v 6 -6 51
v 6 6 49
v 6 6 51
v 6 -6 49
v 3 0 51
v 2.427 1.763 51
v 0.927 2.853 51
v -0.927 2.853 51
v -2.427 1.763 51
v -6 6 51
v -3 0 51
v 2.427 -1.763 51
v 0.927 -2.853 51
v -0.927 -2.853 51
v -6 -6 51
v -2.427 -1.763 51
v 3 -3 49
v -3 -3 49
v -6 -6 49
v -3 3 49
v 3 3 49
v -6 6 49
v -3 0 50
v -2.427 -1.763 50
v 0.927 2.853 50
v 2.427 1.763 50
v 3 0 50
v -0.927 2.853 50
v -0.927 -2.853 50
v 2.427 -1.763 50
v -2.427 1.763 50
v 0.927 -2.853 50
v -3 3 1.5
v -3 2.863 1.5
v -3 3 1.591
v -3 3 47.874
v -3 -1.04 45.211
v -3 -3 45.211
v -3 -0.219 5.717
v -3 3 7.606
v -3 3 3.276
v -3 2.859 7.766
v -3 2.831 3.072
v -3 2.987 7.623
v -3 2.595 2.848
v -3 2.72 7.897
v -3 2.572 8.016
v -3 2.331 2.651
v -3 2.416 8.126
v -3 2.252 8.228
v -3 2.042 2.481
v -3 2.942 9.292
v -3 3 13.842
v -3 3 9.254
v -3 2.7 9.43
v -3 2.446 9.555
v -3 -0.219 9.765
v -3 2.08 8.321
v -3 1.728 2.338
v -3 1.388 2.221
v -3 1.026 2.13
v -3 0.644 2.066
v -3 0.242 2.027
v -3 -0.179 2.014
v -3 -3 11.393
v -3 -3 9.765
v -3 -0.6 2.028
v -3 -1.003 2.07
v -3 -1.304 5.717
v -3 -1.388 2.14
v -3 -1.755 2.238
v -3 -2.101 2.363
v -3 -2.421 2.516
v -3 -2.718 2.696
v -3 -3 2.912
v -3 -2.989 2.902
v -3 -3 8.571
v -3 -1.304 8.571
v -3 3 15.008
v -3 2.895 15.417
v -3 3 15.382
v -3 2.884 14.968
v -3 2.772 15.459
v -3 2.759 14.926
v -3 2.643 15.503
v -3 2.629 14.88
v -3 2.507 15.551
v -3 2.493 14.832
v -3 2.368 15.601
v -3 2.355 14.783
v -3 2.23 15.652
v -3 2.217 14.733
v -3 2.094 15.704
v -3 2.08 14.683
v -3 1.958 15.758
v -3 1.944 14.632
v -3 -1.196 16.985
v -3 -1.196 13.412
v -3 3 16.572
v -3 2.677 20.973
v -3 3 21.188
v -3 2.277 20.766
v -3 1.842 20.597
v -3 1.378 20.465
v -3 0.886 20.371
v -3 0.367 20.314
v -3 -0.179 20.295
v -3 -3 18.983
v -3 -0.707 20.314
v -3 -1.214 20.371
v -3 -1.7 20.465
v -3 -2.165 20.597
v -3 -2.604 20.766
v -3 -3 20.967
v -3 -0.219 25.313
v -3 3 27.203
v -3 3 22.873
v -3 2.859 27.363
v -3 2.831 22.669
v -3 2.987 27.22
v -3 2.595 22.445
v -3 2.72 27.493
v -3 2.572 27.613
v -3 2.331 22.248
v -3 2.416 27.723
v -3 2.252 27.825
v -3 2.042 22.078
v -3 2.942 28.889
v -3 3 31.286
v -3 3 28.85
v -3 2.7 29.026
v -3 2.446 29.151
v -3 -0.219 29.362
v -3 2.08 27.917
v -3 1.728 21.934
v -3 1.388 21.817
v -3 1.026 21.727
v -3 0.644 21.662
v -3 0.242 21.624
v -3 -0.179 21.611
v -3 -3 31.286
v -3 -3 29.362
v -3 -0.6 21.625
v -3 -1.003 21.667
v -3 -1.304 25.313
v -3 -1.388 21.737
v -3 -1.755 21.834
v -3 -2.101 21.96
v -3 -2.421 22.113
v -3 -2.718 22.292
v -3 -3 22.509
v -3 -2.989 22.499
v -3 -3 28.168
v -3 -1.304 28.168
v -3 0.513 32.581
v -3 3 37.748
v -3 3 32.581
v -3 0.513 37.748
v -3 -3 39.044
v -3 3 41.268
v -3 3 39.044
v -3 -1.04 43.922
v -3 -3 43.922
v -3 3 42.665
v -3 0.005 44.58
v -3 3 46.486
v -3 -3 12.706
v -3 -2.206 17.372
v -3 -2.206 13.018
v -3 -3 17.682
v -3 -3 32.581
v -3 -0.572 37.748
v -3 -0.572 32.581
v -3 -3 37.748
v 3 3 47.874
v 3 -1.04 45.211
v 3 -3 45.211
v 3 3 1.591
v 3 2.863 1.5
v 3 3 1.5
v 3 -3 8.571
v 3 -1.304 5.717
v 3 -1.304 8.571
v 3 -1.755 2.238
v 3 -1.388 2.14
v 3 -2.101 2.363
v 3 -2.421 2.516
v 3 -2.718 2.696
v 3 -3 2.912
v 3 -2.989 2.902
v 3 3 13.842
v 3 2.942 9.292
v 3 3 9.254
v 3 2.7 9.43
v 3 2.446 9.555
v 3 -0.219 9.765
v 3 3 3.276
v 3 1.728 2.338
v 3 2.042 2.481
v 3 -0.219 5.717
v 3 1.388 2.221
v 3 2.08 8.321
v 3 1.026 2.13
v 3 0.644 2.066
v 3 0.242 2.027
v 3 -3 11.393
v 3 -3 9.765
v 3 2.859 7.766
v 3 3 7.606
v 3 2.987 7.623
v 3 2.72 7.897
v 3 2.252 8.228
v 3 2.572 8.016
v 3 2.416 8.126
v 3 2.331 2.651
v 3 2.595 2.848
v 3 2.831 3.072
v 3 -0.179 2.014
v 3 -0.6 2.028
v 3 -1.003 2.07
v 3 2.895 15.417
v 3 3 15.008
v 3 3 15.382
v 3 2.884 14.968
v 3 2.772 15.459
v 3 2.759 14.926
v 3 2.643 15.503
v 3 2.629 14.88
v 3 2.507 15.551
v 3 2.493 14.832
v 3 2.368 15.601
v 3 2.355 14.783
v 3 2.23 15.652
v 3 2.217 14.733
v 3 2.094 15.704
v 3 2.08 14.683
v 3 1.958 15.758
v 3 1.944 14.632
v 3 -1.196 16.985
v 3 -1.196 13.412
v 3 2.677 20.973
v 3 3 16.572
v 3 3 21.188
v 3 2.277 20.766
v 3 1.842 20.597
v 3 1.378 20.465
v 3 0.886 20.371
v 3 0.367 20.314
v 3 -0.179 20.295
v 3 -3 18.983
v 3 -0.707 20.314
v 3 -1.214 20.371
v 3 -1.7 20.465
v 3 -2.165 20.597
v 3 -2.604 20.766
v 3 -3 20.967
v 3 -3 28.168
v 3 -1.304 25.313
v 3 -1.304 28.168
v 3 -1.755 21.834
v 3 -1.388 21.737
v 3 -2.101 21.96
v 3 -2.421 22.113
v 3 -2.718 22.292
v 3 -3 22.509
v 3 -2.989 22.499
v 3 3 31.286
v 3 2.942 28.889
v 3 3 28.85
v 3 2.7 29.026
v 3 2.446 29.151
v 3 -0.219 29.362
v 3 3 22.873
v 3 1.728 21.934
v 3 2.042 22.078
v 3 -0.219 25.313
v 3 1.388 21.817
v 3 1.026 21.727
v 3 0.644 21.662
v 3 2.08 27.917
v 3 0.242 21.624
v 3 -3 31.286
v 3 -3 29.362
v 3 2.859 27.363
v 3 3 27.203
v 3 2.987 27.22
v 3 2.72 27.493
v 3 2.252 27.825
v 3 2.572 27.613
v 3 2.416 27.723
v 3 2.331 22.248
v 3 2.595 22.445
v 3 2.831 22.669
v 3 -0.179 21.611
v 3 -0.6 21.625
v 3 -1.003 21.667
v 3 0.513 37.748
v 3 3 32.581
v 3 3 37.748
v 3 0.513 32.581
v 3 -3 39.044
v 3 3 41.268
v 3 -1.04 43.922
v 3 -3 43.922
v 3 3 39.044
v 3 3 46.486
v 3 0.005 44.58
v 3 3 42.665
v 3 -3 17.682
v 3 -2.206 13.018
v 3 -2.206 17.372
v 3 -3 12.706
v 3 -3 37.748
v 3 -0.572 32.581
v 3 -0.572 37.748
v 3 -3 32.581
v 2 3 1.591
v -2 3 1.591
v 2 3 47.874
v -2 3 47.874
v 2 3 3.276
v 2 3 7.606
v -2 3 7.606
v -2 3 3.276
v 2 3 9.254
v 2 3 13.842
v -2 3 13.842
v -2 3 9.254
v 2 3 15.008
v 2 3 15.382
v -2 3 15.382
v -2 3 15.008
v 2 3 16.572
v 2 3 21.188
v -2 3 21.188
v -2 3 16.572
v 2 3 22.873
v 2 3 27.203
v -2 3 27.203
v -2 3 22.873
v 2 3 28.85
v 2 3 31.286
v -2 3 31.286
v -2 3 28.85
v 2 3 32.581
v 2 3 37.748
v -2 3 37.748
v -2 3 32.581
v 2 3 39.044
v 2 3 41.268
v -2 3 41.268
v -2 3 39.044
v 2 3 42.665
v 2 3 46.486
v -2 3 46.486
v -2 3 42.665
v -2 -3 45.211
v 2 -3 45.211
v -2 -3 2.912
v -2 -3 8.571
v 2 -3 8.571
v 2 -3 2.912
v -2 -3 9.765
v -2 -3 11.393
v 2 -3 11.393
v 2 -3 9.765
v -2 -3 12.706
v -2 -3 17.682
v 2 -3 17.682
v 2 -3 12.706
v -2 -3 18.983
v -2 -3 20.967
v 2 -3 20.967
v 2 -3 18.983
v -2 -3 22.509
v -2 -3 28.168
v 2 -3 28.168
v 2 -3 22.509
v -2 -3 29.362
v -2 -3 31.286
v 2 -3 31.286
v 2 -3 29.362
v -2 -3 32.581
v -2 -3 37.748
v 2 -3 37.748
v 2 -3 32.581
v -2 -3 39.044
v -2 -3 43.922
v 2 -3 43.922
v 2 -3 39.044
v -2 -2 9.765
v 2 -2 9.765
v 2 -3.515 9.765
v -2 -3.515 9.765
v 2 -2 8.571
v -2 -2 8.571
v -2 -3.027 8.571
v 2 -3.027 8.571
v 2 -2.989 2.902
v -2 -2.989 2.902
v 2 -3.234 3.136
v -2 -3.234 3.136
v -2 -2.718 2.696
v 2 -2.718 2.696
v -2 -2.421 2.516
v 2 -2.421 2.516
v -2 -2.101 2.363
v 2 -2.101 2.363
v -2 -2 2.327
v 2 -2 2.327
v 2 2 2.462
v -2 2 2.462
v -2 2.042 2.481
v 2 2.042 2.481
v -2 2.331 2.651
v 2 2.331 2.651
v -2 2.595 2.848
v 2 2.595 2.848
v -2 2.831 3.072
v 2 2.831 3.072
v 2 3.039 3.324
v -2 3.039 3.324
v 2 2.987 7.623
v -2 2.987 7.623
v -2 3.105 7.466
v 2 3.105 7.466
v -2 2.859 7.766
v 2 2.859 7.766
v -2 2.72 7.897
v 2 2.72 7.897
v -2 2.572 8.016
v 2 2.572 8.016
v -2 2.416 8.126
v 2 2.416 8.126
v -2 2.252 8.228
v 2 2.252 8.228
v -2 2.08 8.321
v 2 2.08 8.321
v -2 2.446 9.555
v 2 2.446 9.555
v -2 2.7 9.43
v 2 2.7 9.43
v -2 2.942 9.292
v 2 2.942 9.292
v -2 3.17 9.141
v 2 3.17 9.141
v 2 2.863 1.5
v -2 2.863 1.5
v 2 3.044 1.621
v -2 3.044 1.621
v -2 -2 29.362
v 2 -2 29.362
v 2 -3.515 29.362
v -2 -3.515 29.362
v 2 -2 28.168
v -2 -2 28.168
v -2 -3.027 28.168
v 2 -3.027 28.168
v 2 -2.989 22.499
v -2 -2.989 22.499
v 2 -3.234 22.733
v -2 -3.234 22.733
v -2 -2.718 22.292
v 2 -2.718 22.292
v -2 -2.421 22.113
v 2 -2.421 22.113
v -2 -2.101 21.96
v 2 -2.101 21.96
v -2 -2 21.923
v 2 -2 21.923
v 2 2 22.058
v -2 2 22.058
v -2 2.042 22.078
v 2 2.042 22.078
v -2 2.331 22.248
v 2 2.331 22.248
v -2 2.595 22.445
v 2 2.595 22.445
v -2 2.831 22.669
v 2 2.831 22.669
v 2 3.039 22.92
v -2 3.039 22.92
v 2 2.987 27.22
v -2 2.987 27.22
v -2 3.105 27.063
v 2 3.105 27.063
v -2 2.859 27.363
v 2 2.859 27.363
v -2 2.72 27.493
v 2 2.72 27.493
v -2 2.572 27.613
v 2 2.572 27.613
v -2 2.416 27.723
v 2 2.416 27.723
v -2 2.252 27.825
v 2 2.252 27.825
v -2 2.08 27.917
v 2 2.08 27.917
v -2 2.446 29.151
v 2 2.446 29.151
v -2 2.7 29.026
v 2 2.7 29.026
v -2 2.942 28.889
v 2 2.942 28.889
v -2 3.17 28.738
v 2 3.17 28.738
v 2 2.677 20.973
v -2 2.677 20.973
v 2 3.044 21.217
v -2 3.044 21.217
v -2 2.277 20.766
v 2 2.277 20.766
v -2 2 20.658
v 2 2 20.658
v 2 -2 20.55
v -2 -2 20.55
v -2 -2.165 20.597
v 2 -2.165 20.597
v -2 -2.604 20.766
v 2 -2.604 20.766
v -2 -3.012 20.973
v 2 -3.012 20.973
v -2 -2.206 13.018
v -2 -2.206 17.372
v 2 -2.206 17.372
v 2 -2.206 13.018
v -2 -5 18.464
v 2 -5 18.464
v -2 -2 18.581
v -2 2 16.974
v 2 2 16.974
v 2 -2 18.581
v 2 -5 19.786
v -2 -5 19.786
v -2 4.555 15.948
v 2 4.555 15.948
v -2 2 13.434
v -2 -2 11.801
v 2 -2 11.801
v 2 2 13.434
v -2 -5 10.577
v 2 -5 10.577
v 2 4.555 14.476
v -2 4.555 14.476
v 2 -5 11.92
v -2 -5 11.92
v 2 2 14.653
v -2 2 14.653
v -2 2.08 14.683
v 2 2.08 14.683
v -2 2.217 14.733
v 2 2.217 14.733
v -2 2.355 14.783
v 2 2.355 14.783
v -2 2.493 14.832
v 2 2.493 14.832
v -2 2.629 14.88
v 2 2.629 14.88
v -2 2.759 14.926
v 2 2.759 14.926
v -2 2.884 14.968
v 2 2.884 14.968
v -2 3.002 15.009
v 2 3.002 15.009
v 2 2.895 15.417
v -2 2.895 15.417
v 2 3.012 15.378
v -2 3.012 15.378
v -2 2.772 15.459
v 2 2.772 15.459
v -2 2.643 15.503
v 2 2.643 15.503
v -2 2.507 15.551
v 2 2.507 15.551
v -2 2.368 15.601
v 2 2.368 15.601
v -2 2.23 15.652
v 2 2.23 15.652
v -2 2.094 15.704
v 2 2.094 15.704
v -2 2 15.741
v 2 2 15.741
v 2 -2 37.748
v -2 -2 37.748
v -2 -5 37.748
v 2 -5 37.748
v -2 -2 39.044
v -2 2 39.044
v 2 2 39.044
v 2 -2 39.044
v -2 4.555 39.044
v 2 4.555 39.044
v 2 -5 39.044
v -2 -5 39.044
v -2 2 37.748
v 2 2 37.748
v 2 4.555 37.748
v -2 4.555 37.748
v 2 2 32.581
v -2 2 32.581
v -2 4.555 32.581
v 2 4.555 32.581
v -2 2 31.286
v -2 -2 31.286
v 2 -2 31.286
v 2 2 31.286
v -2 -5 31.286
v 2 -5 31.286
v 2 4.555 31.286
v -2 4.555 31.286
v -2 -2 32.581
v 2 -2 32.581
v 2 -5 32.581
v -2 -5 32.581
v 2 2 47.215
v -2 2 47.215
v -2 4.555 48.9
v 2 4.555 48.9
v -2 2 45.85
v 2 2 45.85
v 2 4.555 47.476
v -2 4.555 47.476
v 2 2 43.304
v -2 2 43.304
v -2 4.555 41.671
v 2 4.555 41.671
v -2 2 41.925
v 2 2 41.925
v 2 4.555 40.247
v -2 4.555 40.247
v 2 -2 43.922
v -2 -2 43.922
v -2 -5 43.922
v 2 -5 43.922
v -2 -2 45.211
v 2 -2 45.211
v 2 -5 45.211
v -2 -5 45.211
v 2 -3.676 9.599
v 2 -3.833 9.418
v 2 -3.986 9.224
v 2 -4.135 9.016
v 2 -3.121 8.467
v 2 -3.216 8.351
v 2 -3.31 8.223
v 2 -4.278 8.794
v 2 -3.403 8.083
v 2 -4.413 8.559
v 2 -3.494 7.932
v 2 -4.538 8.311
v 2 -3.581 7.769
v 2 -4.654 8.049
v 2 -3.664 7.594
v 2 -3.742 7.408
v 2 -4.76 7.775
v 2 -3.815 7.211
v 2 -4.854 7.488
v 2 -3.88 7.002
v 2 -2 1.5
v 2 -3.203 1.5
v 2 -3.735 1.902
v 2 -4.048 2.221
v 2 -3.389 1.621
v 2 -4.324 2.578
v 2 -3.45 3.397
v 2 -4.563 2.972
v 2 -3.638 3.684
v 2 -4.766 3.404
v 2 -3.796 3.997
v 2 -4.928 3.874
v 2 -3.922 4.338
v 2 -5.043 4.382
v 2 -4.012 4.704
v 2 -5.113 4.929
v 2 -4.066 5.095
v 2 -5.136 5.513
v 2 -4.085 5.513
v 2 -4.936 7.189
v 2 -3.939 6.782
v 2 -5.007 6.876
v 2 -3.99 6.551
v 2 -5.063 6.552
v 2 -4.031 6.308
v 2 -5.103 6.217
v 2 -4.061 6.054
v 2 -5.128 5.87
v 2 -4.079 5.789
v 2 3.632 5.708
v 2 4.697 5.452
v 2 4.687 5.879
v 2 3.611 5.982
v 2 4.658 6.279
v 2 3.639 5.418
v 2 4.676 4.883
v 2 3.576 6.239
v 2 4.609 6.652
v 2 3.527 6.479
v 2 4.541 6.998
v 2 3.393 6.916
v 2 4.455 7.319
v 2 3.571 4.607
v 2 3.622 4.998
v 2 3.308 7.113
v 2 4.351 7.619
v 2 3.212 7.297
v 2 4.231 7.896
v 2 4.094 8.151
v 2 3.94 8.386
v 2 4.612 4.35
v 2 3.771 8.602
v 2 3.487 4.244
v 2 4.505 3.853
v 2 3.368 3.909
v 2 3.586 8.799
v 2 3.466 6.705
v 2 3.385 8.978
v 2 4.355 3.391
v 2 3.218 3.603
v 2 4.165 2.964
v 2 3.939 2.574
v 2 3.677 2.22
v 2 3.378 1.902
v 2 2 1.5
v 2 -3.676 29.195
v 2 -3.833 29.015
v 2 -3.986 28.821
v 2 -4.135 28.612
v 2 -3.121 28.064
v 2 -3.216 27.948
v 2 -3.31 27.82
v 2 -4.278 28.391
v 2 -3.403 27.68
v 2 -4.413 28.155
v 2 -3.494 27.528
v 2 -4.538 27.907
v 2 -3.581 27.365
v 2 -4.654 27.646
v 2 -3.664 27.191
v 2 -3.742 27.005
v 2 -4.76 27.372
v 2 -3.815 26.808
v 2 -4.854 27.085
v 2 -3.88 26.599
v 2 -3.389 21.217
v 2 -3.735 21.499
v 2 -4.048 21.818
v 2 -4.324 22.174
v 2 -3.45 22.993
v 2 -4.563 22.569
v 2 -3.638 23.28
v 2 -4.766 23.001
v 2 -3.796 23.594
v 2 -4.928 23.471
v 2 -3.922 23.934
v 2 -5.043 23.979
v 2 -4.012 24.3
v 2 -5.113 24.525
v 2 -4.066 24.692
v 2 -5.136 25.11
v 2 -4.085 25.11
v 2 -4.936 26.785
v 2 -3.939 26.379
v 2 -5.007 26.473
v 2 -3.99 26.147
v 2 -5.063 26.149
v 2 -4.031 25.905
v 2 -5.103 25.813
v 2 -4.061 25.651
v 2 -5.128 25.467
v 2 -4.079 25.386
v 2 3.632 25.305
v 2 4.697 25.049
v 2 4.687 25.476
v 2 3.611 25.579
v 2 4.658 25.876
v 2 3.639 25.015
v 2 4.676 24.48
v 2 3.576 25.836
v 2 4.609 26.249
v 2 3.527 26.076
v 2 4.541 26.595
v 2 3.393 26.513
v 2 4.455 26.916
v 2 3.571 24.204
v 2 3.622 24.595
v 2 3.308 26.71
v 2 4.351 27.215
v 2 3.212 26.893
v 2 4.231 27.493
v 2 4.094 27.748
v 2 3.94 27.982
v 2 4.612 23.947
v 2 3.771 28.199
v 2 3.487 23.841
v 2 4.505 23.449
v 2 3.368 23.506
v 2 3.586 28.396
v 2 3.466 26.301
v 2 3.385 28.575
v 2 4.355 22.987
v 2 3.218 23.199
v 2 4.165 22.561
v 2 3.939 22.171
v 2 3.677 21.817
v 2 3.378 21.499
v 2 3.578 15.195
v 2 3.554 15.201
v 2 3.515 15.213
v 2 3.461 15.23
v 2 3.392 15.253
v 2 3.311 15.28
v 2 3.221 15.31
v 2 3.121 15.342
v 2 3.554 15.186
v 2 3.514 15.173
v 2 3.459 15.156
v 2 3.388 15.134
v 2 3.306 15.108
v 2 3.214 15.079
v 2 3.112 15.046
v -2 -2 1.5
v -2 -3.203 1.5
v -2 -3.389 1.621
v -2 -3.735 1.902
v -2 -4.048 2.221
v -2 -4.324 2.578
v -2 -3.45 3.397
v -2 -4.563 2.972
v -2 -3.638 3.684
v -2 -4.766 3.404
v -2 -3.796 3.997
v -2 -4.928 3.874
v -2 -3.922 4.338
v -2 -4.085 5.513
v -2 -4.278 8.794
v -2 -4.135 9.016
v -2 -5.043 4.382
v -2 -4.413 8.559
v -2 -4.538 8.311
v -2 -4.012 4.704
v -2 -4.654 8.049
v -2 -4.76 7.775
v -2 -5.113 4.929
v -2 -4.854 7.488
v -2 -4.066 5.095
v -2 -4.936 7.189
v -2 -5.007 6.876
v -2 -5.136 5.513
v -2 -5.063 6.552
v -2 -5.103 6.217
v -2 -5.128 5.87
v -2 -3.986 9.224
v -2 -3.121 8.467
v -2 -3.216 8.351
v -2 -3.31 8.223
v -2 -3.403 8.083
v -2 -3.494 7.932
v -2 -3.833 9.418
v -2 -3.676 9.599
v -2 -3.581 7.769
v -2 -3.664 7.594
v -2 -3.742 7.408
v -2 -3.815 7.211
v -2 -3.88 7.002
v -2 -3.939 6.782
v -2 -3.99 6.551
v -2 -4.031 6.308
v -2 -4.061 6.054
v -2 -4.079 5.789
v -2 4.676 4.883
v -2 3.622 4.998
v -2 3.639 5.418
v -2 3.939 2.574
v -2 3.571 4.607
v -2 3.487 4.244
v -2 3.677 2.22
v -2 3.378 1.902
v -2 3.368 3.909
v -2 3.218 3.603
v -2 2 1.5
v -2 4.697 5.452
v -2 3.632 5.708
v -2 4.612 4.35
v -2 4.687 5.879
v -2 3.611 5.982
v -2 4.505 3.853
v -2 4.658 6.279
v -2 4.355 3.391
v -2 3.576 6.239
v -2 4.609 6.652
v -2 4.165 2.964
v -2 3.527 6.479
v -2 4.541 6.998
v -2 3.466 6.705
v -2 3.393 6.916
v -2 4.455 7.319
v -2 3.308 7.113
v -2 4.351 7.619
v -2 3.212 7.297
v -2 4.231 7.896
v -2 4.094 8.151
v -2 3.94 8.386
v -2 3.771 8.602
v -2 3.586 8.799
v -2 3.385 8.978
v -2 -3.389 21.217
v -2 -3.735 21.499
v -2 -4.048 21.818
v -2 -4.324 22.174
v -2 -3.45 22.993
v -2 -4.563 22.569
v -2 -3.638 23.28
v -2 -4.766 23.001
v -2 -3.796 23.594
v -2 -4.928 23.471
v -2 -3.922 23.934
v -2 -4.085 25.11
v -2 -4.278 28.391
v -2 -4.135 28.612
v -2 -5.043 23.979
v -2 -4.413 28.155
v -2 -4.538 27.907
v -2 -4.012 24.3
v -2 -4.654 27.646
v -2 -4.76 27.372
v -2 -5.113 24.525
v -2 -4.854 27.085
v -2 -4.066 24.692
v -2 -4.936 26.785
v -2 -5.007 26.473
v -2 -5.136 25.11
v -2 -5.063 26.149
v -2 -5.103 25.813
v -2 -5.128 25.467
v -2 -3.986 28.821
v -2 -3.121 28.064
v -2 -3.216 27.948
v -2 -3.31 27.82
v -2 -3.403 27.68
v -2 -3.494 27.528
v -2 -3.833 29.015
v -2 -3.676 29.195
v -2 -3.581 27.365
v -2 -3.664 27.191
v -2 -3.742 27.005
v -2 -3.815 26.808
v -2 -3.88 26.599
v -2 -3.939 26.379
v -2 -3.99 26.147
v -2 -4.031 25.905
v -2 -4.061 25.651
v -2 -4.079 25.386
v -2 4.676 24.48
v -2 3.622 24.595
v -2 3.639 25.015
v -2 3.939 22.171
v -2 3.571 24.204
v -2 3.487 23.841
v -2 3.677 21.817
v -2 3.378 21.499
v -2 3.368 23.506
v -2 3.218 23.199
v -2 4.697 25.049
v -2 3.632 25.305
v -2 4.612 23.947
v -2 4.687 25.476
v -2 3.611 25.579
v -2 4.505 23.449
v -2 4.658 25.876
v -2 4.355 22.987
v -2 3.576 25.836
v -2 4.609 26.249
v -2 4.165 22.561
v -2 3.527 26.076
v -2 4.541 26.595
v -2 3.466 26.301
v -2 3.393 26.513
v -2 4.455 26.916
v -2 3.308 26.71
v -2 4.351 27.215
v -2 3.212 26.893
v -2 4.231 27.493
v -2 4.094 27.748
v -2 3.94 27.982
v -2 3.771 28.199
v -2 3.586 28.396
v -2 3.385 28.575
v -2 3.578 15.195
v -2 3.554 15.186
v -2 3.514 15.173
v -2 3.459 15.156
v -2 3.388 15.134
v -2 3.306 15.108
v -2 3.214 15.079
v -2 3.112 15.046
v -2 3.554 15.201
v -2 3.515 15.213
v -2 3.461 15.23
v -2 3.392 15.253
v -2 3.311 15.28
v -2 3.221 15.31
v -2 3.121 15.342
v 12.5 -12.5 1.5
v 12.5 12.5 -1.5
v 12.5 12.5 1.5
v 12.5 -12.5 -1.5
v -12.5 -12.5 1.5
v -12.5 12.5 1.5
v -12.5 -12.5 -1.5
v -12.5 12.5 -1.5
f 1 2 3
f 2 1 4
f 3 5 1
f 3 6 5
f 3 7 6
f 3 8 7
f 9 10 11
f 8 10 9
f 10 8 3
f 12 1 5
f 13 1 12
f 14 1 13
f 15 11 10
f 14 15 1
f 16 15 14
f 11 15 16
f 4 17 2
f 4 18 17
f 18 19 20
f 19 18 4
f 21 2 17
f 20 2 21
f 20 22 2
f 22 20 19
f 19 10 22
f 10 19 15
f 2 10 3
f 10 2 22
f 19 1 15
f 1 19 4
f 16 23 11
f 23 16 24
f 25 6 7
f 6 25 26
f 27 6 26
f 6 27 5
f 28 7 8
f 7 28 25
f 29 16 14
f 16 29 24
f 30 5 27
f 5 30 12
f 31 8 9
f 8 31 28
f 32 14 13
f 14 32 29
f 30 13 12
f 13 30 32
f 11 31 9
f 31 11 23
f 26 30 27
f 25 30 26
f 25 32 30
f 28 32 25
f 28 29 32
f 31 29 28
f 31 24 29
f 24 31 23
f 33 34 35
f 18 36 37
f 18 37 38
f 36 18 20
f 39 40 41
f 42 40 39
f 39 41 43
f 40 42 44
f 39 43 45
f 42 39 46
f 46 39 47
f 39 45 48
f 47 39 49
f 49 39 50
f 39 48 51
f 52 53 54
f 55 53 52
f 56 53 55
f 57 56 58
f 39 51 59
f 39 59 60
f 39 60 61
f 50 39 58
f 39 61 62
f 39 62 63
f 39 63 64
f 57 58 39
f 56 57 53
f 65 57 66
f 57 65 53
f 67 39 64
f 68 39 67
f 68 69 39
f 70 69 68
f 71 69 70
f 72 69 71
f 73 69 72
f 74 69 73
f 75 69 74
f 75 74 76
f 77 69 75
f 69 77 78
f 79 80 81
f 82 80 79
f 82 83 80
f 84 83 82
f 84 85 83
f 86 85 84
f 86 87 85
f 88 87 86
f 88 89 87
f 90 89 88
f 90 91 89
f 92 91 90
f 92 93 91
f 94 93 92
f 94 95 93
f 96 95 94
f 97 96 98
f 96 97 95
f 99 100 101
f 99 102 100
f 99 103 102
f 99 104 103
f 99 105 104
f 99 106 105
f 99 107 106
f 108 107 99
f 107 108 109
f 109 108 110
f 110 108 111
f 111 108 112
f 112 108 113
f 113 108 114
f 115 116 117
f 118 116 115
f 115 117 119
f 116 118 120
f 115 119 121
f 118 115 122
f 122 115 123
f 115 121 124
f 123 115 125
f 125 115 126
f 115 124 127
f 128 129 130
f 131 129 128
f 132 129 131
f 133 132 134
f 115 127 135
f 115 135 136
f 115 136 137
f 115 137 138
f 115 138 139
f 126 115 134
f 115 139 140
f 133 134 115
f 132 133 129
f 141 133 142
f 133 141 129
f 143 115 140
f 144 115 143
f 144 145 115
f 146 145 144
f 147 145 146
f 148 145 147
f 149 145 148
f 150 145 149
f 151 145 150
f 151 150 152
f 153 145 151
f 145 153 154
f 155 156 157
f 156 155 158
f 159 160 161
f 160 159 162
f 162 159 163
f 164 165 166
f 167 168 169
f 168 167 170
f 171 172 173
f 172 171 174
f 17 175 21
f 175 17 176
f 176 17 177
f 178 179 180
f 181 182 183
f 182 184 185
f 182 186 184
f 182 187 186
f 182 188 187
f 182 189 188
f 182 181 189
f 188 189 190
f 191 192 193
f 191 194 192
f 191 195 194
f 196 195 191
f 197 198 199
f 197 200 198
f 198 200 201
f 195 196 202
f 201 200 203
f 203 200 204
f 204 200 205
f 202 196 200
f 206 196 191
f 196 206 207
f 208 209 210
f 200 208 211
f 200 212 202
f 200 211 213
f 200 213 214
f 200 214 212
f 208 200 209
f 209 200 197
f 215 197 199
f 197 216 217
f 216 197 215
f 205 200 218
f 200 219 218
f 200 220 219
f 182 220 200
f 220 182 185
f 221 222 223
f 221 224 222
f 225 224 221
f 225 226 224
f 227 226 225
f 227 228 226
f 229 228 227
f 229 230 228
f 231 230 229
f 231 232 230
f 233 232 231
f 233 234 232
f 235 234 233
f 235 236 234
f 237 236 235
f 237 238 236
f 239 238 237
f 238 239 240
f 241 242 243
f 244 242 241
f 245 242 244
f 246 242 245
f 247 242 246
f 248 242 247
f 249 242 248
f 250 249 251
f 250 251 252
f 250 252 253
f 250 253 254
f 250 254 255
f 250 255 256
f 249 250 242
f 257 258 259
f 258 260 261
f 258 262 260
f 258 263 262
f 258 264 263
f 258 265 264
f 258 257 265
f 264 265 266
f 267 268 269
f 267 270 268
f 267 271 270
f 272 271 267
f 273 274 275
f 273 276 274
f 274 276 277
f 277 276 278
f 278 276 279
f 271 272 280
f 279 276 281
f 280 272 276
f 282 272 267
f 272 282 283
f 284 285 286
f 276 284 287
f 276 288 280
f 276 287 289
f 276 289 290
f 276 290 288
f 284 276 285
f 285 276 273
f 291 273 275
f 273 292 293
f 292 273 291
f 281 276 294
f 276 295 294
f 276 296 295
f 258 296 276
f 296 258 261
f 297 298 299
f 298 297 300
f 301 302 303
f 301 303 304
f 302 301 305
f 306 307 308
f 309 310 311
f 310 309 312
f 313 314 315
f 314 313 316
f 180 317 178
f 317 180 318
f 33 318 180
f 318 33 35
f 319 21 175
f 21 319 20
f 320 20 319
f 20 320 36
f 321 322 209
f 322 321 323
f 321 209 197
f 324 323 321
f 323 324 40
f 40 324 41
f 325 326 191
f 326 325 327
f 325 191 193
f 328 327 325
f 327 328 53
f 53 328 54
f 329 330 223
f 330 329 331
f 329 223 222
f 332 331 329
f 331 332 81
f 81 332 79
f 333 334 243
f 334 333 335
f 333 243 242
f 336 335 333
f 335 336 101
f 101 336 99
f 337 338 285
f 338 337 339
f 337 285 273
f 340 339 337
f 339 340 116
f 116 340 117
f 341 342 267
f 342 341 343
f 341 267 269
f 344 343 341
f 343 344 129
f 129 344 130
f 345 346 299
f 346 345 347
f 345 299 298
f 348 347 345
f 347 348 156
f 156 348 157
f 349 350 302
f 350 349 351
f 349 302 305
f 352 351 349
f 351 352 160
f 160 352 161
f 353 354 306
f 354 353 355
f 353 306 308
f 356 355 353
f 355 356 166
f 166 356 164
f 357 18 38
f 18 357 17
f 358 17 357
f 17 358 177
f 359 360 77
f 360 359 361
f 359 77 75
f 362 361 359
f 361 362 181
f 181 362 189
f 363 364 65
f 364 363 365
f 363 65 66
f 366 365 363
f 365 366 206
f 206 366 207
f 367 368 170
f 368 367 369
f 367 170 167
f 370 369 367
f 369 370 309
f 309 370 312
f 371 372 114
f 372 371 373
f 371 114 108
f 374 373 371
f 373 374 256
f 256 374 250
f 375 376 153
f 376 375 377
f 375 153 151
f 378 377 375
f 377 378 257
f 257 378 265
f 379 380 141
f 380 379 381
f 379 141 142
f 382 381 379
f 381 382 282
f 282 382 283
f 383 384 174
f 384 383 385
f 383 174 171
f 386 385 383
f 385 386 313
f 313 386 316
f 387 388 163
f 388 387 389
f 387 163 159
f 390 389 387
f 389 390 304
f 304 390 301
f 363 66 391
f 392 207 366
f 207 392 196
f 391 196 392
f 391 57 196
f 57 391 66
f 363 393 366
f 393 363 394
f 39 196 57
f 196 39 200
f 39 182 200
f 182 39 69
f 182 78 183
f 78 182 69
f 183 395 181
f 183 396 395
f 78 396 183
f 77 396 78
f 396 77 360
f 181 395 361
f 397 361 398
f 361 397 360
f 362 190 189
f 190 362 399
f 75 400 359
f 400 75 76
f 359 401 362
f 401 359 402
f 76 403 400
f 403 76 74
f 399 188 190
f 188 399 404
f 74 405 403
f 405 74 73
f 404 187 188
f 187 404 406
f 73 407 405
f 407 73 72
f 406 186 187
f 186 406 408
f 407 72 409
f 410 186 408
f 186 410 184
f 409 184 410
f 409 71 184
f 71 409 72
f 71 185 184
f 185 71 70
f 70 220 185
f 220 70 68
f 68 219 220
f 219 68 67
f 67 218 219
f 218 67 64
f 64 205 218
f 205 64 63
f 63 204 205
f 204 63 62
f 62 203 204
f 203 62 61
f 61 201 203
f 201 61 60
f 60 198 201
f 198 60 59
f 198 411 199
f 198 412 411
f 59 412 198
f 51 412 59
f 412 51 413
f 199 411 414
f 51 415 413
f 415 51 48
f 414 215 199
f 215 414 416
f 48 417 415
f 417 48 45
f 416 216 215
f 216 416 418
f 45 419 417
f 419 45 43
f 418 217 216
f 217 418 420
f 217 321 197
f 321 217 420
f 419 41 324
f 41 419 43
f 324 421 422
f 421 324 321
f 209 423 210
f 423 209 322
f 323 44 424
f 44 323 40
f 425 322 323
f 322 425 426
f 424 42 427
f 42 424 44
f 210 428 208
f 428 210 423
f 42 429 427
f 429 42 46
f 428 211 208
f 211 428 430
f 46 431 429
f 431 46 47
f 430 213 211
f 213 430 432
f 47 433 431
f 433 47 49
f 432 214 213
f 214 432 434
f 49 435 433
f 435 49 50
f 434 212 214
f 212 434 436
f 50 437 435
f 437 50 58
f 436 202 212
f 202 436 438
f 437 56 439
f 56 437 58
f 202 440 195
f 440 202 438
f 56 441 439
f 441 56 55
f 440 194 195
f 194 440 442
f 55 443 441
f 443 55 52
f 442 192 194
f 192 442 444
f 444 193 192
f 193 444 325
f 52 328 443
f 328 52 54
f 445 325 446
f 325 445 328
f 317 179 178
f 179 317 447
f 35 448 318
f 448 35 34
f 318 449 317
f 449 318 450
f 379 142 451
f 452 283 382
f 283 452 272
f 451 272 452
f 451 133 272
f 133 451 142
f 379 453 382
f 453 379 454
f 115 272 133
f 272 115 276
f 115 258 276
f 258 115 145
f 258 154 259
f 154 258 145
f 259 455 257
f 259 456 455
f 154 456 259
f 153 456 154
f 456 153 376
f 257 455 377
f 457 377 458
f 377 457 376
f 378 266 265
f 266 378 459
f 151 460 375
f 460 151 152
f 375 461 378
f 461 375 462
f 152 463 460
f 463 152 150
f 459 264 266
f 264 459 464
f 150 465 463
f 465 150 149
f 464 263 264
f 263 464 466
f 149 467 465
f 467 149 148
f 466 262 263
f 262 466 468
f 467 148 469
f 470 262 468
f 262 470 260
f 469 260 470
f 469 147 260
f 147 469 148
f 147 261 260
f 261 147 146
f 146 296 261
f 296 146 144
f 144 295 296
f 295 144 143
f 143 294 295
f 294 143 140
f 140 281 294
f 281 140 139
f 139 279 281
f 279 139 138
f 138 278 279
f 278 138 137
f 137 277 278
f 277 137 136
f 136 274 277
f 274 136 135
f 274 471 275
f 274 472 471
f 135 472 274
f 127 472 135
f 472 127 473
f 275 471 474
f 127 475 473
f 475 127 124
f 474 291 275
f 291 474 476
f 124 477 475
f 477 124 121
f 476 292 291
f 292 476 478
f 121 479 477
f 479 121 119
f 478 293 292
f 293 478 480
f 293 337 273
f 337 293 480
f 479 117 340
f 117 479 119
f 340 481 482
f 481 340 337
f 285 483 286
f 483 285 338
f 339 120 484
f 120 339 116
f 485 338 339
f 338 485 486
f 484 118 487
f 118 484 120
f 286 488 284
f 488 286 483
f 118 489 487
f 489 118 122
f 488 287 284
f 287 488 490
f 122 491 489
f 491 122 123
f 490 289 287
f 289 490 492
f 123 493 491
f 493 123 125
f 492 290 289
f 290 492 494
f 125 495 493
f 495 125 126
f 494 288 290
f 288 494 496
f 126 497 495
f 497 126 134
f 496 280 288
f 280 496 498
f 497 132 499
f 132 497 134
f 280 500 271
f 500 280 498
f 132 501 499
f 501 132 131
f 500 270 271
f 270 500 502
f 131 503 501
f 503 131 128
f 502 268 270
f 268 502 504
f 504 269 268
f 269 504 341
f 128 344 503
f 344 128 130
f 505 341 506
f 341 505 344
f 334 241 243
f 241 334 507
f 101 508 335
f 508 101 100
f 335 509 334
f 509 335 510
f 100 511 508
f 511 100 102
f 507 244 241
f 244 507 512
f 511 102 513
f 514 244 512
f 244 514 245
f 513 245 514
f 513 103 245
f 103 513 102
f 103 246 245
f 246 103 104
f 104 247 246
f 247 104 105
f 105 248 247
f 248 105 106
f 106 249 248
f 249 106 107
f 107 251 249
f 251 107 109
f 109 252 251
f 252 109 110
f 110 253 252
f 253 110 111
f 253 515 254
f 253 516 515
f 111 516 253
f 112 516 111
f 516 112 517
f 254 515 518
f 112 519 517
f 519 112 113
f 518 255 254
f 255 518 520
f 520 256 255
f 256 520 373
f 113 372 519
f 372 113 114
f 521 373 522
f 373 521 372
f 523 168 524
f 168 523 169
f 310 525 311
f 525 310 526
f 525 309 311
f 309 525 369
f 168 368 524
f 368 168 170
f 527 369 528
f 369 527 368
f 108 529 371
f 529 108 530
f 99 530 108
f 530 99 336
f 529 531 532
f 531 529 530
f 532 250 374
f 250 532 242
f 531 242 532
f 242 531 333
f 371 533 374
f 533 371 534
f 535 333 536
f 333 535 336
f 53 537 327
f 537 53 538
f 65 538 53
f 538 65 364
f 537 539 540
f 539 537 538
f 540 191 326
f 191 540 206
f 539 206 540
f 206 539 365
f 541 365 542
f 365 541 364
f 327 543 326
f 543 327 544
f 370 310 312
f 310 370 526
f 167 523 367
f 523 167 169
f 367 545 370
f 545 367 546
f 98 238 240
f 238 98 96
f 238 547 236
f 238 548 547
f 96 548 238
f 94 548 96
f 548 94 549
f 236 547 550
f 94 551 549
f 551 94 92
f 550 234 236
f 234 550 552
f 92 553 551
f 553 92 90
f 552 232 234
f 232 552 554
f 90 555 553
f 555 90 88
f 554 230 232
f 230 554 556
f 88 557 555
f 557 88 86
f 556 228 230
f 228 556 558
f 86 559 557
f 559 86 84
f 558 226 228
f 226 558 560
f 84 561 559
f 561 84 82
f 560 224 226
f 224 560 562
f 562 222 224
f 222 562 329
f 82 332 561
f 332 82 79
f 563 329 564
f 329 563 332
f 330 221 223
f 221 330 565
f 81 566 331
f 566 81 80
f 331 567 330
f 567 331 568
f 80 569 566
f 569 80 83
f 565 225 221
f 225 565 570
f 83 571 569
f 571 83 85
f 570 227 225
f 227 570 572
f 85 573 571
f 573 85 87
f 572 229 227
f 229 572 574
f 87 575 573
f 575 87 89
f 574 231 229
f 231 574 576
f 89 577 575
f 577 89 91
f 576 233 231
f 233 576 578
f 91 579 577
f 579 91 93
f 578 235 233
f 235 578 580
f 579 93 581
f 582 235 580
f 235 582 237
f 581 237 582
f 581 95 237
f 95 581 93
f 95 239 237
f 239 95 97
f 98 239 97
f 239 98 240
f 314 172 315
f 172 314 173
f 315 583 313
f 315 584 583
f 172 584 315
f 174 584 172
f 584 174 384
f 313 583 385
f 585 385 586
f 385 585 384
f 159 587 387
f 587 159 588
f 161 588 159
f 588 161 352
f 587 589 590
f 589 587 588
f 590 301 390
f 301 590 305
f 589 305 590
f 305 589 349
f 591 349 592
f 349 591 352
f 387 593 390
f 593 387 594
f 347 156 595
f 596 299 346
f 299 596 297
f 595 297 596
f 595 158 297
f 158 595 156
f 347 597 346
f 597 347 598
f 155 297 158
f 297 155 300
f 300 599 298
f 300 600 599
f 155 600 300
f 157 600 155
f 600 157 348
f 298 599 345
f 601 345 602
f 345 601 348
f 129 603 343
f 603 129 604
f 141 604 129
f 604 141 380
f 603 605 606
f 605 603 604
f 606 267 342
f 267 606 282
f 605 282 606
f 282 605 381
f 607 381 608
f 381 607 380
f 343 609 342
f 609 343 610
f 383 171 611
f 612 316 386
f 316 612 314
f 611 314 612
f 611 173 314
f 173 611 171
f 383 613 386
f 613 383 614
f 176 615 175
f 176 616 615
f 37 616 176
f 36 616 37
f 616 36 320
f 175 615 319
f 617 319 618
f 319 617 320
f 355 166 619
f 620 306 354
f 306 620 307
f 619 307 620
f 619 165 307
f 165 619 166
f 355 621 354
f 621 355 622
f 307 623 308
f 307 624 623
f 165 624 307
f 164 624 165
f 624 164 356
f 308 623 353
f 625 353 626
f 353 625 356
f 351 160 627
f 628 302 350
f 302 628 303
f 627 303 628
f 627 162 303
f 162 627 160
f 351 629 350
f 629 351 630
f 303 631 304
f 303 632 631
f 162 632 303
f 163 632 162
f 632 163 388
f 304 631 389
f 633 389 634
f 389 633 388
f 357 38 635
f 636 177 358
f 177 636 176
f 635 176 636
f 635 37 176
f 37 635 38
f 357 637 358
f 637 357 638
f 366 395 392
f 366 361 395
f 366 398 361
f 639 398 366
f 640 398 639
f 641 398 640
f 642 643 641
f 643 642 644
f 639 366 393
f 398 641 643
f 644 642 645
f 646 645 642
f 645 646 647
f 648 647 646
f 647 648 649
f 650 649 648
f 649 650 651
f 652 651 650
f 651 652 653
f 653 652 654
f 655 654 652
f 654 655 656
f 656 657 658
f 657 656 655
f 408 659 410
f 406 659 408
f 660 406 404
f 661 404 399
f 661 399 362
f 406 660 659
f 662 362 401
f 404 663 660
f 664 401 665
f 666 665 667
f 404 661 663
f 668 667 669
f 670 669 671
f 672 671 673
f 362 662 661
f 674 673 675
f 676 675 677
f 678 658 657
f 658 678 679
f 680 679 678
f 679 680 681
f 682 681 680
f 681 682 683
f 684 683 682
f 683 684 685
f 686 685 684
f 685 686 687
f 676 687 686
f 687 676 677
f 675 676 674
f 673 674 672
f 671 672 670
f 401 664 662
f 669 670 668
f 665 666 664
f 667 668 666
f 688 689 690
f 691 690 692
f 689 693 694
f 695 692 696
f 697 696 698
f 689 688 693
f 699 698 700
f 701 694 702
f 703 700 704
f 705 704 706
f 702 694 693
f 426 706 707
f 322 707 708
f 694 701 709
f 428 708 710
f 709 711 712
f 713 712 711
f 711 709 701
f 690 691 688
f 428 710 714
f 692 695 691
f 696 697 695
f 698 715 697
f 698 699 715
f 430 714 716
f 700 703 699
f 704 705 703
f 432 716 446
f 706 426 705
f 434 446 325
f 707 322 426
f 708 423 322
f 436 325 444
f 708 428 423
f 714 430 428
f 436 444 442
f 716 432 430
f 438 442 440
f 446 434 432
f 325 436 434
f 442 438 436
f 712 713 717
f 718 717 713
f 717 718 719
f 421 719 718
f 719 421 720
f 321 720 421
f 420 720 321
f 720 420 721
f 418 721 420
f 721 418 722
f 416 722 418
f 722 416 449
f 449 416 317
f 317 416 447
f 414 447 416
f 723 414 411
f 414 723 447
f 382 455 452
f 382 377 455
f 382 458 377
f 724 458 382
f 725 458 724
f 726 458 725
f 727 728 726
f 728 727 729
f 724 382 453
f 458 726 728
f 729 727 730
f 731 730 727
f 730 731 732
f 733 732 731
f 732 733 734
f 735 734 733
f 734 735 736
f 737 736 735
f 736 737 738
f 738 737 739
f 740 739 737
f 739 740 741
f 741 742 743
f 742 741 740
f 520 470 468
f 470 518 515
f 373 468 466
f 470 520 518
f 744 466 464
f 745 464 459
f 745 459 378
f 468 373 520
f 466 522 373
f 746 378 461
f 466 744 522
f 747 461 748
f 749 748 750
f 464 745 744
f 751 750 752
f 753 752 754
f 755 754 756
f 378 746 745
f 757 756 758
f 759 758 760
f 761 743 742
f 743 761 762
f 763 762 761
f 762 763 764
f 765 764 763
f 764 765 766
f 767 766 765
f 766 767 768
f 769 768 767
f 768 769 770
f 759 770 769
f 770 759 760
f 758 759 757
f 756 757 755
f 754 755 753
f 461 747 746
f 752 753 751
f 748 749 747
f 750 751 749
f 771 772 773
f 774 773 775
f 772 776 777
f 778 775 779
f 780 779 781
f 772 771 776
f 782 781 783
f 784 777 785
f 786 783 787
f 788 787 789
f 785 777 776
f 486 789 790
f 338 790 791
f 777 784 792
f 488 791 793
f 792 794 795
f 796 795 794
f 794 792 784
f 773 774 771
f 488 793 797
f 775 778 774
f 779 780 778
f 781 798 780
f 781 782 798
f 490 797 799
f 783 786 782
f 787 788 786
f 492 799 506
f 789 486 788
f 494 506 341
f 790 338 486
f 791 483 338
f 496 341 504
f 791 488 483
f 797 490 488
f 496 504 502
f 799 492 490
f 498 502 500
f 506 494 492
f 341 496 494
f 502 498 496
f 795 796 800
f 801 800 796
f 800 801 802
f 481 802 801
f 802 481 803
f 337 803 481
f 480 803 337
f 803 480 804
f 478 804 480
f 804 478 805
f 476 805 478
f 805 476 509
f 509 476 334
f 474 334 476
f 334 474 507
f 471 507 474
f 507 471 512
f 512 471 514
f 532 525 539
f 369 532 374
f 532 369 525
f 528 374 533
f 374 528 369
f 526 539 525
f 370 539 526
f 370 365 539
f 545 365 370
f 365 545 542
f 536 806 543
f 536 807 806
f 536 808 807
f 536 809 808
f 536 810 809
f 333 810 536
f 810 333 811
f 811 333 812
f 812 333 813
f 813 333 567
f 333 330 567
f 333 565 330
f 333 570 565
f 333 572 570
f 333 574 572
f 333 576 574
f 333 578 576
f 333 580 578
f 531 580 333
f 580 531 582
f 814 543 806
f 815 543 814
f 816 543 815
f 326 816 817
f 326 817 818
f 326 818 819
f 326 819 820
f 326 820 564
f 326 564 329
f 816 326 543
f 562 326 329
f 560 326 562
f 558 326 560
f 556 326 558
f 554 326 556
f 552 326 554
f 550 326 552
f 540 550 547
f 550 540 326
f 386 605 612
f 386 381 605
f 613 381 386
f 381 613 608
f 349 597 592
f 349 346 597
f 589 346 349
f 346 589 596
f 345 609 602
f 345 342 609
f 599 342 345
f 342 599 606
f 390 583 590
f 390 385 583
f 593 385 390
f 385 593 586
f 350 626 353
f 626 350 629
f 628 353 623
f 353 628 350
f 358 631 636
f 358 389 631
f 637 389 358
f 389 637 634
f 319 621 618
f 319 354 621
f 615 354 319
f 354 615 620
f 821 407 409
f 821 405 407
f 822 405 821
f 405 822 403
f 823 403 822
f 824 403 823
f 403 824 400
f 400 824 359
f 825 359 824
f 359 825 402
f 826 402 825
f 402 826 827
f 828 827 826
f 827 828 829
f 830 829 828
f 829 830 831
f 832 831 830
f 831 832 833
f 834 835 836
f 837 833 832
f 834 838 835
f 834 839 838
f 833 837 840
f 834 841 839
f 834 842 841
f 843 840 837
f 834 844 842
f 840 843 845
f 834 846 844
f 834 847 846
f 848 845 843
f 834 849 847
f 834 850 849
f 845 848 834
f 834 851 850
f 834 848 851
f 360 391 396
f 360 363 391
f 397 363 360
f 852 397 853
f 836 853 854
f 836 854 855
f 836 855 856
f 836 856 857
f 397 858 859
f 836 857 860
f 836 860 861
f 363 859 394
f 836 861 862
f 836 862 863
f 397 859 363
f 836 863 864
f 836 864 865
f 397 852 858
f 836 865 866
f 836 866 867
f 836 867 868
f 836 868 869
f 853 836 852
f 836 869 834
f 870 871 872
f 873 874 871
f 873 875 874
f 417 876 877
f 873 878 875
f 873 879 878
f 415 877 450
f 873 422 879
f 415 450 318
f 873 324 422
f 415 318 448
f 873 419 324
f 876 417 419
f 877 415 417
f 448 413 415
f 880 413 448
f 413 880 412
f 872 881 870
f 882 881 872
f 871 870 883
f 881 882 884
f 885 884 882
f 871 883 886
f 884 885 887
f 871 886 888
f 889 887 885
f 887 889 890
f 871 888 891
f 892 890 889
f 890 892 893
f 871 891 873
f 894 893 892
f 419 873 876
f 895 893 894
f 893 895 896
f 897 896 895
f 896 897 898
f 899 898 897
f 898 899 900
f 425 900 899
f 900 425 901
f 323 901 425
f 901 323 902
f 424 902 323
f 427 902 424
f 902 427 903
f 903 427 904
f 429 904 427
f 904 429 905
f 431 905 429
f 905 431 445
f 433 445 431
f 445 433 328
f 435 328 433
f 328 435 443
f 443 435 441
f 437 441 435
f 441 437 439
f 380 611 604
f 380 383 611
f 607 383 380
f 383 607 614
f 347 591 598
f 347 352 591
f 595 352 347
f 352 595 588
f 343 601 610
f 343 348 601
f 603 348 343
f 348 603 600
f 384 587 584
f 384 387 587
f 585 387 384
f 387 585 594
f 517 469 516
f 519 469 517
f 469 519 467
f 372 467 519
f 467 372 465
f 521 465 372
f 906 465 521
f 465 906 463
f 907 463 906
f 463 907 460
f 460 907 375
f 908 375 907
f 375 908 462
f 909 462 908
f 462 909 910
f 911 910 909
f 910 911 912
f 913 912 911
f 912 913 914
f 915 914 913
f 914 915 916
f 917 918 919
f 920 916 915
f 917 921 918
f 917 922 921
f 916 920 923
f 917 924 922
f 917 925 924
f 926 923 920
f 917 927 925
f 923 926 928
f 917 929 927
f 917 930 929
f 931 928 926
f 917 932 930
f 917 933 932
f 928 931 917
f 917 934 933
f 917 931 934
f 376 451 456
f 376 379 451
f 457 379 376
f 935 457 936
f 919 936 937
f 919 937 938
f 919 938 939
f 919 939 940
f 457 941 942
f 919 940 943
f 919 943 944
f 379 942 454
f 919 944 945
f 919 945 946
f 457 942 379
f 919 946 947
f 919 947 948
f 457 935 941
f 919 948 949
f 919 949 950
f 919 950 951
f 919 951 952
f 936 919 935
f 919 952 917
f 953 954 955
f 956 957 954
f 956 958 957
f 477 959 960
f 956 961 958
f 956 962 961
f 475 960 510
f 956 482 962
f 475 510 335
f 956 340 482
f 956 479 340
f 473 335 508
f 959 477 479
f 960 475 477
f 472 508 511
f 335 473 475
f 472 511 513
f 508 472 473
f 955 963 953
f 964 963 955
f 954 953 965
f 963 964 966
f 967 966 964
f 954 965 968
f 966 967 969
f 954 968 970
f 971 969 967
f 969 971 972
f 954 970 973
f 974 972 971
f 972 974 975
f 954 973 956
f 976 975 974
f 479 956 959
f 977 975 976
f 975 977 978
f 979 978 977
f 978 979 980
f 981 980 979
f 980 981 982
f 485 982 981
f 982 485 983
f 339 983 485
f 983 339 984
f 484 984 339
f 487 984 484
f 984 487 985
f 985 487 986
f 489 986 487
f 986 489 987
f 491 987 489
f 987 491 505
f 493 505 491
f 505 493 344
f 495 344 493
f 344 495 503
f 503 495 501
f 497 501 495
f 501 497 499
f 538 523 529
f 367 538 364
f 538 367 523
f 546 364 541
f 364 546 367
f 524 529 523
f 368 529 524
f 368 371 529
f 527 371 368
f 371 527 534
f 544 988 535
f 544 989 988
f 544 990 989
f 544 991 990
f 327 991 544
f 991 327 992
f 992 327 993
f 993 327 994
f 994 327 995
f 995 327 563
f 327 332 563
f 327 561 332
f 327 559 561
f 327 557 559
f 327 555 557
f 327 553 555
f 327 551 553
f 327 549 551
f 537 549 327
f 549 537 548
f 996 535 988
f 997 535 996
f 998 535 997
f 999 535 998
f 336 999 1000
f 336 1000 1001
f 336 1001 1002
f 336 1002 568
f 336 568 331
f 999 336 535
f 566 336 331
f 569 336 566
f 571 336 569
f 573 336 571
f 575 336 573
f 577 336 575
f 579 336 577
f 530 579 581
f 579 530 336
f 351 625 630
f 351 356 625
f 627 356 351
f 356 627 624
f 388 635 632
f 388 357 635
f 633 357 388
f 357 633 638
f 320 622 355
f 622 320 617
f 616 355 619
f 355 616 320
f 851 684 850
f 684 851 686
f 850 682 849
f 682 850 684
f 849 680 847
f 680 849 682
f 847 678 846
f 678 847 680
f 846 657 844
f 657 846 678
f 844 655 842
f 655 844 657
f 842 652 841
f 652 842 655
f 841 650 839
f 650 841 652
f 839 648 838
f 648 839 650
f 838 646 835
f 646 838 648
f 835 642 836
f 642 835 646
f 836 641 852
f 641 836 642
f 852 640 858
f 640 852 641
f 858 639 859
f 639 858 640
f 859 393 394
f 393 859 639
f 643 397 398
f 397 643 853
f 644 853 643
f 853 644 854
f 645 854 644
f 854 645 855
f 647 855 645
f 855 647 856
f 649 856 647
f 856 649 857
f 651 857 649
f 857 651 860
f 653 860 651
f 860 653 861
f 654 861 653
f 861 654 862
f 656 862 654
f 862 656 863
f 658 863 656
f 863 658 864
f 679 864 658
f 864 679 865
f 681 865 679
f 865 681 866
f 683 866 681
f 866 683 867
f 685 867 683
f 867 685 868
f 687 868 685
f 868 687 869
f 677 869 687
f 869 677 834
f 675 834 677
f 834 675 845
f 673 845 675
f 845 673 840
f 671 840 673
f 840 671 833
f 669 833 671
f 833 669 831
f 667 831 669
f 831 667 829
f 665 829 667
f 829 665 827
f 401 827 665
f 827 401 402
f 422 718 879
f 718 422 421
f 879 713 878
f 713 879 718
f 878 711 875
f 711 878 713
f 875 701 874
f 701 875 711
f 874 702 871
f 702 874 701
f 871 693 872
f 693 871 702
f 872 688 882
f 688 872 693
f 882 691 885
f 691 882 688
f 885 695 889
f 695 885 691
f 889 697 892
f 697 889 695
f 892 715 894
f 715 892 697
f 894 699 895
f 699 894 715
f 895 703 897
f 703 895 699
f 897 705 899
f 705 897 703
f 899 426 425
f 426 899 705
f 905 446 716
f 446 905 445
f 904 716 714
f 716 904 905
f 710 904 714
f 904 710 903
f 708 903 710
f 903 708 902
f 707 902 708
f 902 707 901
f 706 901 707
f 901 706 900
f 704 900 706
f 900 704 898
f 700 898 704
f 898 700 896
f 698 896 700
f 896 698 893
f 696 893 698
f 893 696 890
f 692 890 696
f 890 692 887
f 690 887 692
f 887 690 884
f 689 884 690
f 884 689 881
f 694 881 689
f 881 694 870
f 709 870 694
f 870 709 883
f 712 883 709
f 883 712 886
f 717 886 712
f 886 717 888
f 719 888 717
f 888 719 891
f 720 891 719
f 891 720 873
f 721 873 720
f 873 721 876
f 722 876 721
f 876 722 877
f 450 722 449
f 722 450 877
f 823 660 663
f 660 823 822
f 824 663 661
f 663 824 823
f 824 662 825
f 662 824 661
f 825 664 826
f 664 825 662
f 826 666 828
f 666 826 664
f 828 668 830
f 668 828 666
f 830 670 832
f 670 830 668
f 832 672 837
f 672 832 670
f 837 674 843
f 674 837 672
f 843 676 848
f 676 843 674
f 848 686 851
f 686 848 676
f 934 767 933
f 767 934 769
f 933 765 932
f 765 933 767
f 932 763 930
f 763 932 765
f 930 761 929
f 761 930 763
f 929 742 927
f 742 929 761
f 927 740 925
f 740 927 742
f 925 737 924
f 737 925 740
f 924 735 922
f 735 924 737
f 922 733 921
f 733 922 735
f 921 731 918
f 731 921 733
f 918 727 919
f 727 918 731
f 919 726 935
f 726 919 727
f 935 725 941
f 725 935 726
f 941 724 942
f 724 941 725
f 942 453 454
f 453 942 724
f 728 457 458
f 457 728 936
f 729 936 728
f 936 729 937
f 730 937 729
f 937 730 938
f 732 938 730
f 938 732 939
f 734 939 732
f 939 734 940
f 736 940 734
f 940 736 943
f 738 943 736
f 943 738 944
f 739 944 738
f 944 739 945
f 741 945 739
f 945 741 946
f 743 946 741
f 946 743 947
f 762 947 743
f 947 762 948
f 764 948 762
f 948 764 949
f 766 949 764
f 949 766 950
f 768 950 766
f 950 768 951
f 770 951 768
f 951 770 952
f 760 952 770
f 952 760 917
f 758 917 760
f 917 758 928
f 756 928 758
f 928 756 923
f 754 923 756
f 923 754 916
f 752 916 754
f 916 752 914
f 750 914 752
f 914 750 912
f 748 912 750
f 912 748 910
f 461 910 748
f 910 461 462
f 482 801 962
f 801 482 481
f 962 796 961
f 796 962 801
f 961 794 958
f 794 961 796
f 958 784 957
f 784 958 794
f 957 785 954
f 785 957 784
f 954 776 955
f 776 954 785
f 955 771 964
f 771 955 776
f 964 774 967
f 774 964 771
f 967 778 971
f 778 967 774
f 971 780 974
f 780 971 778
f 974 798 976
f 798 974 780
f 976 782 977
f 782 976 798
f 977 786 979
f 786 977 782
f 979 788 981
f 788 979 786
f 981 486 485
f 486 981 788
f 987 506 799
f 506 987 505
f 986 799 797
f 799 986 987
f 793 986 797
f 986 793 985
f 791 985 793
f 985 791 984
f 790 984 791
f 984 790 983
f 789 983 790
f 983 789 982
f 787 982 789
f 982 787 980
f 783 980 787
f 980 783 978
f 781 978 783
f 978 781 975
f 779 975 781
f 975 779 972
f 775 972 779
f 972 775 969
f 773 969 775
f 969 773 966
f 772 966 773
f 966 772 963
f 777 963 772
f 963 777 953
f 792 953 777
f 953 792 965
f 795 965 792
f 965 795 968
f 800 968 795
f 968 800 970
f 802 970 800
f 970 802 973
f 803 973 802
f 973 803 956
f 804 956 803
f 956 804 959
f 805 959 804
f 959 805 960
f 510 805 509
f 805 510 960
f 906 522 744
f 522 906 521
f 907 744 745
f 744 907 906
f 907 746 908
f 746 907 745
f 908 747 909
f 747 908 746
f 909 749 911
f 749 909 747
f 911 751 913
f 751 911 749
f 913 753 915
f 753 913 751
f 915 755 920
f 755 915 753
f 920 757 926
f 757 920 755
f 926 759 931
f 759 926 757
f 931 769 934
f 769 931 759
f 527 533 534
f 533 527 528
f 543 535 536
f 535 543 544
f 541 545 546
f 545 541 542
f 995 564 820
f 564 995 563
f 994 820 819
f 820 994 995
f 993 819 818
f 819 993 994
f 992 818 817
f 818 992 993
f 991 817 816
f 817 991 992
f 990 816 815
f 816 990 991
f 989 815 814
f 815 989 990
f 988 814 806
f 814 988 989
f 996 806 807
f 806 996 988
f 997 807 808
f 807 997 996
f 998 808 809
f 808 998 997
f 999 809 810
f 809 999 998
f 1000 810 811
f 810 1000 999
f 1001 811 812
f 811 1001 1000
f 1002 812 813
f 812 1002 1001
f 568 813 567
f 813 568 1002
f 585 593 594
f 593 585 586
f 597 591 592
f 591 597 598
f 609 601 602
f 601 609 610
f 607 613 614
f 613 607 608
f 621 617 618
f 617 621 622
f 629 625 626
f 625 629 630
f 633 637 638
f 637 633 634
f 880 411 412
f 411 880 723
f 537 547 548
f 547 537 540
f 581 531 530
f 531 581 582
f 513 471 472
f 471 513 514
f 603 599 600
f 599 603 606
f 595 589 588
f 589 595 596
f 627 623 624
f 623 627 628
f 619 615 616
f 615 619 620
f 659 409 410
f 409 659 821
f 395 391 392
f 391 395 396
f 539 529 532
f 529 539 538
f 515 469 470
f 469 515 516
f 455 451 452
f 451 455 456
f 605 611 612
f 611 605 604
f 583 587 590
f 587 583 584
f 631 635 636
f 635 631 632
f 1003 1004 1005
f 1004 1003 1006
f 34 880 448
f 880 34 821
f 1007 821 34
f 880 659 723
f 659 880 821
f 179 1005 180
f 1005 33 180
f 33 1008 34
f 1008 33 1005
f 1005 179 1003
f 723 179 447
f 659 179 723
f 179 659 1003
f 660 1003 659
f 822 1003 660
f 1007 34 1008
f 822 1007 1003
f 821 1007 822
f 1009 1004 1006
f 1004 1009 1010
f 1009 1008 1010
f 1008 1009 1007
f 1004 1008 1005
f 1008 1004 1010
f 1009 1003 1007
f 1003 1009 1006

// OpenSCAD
scritta="GAGHY";

module nome(){

difference(){
    translate([0,2,1]) //scritta vuota
    cube([50,6,6],false);

    linear_extrude(8)
    text(scritta,size=10);
}


difference(){
    translate([0,0,2])
    linear_extrude(4) //scritta piena
    text(scritta,size=10);
    
    translate([0,3,0])
    cube([50,4,8],false);

}
}

cube([25,25,3],true); //base inferiore

difference(){
translate([0,0,50])
cube([12,12,2],true); //base superiore

translate([0,0,50])
cylinder(2,3,3,false,$fn=10); //foro porta calamita
}

translate([4,-5,0])
rotate([0,-90,0])
nome();     //gambo
